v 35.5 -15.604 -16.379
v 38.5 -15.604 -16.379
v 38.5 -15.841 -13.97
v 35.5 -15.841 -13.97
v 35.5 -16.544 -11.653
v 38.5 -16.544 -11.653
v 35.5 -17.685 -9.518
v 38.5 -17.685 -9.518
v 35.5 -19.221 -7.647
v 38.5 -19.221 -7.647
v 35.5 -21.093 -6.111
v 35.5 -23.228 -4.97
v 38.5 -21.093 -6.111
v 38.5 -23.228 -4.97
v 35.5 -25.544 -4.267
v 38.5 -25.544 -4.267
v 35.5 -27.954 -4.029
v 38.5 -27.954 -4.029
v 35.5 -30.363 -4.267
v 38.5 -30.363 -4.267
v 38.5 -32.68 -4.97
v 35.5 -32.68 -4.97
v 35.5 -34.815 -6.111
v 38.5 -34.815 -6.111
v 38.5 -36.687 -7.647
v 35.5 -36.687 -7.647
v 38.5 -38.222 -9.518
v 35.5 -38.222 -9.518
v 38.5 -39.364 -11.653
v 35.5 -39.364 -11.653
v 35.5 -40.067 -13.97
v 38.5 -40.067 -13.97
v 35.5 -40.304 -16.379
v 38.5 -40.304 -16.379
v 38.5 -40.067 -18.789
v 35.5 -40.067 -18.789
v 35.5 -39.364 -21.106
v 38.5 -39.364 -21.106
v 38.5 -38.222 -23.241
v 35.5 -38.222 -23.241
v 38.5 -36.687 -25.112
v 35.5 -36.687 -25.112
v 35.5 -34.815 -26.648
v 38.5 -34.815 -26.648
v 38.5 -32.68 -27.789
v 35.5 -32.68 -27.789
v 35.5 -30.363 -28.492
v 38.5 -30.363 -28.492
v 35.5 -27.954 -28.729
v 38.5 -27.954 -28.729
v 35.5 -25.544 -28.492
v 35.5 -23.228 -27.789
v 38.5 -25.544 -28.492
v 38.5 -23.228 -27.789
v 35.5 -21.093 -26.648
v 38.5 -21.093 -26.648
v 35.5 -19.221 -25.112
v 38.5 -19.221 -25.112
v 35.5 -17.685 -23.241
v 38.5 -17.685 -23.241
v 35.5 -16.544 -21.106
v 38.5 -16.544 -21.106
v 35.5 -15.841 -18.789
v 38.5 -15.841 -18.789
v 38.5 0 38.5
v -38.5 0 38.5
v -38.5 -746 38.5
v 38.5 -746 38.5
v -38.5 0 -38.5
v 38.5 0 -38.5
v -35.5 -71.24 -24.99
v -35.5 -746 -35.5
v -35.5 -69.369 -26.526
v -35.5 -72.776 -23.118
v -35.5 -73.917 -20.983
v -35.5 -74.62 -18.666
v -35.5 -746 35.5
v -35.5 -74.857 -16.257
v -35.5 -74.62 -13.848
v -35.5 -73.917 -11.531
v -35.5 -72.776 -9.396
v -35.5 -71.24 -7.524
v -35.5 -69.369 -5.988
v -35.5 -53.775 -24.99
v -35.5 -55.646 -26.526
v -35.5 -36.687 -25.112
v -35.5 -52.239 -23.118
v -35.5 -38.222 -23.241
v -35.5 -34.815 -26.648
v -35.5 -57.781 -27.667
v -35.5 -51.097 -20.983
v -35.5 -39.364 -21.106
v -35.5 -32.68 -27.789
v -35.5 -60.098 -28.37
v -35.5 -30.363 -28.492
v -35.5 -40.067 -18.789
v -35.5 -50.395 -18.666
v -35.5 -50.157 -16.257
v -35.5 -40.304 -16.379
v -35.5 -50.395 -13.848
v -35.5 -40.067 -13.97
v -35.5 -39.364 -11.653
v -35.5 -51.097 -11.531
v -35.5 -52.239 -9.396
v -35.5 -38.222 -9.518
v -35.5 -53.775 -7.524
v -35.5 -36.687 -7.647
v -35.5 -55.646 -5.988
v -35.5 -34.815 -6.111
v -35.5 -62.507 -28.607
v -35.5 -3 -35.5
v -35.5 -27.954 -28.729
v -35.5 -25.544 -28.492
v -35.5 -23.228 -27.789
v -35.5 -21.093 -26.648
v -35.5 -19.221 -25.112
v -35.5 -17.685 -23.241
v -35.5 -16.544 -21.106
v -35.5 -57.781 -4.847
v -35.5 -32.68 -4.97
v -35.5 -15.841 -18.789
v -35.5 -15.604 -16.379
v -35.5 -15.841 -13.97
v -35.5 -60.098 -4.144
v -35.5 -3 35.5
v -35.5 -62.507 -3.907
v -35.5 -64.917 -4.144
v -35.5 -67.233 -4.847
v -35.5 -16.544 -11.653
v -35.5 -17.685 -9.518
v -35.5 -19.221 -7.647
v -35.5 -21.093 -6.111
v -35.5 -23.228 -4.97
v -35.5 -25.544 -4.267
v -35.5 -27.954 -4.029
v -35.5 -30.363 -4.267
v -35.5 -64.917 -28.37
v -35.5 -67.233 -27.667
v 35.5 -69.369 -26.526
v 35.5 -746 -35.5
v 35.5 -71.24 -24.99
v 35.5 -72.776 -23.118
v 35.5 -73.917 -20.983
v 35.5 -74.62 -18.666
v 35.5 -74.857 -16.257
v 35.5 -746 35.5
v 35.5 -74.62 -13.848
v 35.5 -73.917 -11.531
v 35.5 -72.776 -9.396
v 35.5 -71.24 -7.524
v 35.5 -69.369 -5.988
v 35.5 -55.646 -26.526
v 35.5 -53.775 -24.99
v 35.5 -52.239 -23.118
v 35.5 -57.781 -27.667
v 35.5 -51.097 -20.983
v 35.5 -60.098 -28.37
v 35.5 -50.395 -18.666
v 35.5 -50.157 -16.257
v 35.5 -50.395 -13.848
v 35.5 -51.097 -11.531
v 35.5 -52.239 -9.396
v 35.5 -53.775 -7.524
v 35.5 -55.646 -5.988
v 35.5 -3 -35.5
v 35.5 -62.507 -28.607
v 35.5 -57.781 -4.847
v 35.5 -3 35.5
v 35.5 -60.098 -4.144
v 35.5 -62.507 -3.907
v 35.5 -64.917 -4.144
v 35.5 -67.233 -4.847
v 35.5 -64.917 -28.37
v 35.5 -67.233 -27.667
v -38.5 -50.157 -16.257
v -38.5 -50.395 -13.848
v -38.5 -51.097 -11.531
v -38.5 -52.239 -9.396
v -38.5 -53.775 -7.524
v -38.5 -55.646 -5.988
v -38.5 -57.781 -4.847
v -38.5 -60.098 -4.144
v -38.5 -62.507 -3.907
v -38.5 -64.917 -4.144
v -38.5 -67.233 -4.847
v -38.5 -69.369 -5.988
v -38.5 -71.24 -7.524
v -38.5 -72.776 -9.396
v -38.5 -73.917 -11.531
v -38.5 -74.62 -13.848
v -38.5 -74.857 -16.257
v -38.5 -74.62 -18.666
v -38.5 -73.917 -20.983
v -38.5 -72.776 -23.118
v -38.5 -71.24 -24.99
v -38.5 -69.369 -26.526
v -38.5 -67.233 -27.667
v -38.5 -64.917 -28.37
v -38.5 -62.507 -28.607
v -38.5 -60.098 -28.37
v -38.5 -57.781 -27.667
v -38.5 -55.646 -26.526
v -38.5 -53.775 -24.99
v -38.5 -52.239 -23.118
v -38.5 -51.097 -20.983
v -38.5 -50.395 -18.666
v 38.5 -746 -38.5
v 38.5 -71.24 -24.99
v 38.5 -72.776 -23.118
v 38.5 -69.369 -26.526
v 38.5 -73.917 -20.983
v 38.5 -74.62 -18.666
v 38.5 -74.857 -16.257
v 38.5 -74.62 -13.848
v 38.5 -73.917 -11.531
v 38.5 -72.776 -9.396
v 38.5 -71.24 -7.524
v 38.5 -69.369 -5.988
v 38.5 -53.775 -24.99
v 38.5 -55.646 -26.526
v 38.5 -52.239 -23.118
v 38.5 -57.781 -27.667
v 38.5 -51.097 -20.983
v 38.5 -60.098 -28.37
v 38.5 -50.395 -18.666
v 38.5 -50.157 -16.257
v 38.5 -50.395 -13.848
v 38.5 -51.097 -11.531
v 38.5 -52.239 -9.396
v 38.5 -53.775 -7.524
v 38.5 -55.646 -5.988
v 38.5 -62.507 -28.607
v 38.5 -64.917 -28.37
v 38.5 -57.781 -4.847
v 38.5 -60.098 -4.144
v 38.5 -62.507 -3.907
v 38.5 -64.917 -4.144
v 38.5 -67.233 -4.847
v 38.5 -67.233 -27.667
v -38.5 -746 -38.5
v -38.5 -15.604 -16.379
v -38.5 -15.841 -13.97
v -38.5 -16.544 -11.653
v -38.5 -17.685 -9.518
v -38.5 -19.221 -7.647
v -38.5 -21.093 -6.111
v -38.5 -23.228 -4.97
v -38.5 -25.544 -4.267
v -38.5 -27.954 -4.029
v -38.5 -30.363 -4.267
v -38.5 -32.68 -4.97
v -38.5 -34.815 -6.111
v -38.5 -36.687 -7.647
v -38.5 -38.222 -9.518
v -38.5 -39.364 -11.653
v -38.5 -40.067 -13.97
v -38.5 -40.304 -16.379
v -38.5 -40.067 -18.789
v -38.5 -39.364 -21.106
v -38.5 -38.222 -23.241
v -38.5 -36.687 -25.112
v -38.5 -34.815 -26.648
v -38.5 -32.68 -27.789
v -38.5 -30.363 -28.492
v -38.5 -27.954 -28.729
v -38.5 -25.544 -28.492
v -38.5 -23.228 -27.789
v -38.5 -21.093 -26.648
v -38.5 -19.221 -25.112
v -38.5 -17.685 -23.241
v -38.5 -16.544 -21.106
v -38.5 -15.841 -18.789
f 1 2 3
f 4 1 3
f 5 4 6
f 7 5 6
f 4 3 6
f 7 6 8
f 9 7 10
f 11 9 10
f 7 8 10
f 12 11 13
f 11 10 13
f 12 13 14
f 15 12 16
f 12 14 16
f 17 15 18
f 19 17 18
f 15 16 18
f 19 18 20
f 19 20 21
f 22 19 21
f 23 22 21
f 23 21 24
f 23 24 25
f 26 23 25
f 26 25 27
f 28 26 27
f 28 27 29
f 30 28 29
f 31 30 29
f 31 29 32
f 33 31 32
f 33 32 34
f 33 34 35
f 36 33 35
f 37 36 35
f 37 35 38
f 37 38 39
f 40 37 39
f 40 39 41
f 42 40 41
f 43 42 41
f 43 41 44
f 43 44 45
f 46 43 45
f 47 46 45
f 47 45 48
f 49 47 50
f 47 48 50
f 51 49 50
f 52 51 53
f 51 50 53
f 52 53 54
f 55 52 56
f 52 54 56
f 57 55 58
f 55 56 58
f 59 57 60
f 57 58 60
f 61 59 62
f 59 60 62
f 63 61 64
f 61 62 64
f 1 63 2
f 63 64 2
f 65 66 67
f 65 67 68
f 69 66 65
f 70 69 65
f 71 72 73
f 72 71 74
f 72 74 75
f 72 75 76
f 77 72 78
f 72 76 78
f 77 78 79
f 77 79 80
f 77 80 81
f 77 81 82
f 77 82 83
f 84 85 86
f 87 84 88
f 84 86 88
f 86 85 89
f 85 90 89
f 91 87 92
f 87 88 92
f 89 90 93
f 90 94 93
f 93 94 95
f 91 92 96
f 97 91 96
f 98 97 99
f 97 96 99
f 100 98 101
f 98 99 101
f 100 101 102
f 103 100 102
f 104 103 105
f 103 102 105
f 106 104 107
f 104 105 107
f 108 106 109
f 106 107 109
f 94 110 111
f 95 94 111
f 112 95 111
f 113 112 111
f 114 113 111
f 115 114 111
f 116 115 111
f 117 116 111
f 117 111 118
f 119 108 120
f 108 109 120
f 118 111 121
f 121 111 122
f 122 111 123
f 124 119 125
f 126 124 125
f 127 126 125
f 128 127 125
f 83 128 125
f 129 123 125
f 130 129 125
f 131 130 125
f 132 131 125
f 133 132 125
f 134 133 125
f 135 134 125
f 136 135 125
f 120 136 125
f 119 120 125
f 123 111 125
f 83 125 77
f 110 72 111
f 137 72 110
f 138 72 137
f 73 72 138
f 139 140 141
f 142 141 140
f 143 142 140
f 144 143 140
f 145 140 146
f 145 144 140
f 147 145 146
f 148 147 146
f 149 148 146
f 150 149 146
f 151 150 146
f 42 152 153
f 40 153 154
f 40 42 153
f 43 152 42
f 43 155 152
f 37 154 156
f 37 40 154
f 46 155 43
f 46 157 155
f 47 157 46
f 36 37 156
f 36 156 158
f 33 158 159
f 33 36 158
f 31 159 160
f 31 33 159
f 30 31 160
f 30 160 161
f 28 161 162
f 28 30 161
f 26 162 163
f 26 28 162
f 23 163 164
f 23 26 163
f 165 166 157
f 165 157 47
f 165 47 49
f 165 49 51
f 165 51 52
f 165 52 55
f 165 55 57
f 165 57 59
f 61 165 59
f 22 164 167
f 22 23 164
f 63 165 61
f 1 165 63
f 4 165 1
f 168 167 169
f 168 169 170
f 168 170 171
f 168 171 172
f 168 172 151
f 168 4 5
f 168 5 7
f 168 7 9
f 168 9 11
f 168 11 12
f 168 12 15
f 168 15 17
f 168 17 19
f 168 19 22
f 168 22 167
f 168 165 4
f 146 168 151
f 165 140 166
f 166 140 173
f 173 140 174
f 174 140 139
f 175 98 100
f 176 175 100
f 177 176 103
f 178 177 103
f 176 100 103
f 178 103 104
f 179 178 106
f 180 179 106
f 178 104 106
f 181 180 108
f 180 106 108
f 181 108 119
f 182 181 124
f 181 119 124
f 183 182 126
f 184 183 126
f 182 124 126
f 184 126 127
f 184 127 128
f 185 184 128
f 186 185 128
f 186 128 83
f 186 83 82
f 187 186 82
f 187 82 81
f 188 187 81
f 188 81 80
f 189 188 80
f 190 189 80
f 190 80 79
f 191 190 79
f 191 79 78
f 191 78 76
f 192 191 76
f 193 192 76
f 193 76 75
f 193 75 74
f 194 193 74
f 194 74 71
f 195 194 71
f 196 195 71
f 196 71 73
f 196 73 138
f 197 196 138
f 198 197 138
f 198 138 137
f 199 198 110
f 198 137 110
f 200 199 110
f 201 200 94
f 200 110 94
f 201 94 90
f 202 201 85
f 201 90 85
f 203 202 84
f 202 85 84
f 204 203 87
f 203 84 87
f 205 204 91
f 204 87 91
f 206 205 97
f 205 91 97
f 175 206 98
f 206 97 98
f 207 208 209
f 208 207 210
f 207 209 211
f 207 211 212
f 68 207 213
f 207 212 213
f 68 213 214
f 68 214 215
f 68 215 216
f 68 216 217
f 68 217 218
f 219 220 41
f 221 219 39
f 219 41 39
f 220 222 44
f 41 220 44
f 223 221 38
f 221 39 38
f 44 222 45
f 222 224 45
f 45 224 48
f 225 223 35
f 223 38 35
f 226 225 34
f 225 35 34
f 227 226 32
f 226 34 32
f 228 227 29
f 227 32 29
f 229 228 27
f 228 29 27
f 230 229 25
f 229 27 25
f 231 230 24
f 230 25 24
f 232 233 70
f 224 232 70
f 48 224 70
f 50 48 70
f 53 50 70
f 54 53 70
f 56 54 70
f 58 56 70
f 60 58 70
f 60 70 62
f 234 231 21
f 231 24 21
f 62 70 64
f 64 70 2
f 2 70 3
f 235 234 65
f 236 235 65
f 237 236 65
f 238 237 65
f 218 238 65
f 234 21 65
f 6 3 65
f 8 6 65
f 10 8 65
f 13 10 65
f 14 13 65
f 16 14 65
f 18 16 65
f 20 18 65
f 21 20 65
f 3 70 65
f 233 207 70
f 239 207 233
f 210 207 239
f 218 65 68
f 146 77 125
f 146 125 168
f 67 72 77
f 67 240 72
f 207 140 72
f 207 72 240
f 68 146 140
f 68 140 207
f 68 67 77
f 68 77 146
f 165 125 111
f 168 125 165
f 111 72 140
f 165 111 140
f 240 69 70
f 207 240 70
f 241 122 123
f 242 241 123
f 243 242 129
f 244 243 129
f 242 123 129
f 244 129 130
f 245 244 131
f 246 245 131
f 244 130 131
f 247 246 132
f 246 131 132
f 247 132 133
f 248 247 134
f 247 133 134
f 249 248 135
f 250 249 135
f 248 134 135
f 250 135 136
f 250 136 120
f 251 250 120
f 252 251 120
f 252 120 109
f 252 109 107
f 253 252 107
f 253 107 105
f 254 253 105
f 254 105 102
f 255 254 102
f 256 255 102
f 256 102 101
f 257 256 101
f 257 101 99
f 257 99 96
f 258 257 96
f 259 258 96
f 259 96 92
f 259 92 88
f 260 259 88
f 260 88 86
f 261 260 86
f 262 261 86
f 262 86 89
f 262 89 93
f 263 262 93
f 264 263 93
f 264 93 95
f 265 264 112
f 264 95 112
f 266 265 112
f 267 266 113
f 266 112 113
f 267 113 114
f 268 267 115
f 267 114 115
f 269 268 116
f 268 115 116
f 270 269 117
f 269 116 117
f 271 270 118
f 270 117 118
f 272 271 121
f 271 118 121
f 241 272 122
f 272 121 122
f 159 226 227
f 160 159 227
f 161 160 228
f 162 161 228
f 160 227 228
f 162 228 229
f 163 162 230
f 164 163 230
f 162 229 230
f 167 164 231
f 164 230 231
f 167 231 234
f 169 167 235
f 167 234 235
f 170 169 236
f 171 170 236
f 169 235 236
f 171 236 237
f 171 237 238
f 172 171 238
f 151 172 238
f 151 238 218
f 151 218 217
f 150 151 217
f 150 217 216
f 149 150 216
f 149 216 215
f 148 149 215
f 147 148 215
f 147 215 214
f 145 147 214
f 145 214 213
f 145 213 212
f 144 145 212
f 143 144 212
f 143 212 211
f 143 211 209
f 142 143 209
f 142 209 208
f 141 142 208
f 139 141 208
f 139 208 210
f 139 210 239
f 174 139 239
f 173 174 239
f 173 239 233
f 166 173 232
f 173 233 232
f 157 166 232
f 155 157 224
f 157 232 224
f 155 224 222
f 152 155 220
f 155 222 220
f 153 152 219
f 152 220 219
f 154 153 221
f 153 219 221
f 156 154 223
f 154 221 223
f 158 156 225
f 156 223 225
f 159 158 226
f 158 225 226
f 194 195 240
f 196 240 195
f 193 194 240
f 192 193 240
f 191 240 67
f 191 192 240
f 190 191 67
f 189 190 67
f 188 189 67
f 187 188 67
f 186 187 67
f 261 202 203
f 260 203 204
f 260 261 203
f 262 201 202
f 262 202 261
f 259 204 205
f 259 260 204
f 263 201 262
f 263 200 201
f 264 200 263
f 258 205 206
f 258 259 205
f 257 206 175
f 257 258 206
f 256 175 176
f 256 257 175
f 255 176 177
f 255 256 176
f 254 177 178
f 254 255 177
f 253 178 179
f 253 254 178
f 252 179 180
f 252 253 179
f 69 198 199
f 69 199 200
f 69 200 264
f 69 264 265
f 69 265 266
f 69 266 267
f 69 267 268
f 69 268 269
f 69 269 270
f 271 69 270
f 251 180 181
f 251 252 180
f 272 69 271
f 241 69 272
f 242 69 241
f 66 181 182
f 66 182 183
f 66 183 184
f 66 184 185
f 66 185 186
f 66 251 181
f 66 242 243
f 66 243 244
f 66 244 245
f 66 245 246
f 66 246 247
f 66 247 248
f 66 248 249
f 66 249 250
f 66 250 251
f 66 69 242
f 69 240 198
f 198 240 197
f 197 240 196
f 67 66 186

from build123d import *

# Parameters (mm, degrees)
F0_W     = 77
F0_H     = 77
F1_DEPTH = 746
F2_T     = -3
F4_D     = 24.7
F6_D     = 24.7


with BuildPart() as f1:
    # F0 (on Front) → F1 (new body)
    with BuildSketch(Plane.XZ):
        Rectangle(F0_W, F0_H)
    extrude(amount=F1_DEPTH)

    # F2
    f2_openings = [f1.faces().sort_by_distance(p)[0] for p in [
        (0, -746, 0),
    ]]
    offset(amount=F2_T, openings=f2_openings)

    # F4 (through all)
    with Locations(Plane(origin=(-38.5, 0, 0), x_dir=(0, -1, 0), z_dir=(-1, 0, 0))):
        with Locations((27.953846, -16.379451)):
            Hole(F4_D / 2)

    # F6 (through all)
    with Locations(Plane(origin=(-38.5, 0, 0), x_dir=(0, -1, 0), z_dir=(-1, 0, 0))):
        with Locations((62.507309, -16.257038)):
            Hole(F6_D / 2)


solid = f1.part
